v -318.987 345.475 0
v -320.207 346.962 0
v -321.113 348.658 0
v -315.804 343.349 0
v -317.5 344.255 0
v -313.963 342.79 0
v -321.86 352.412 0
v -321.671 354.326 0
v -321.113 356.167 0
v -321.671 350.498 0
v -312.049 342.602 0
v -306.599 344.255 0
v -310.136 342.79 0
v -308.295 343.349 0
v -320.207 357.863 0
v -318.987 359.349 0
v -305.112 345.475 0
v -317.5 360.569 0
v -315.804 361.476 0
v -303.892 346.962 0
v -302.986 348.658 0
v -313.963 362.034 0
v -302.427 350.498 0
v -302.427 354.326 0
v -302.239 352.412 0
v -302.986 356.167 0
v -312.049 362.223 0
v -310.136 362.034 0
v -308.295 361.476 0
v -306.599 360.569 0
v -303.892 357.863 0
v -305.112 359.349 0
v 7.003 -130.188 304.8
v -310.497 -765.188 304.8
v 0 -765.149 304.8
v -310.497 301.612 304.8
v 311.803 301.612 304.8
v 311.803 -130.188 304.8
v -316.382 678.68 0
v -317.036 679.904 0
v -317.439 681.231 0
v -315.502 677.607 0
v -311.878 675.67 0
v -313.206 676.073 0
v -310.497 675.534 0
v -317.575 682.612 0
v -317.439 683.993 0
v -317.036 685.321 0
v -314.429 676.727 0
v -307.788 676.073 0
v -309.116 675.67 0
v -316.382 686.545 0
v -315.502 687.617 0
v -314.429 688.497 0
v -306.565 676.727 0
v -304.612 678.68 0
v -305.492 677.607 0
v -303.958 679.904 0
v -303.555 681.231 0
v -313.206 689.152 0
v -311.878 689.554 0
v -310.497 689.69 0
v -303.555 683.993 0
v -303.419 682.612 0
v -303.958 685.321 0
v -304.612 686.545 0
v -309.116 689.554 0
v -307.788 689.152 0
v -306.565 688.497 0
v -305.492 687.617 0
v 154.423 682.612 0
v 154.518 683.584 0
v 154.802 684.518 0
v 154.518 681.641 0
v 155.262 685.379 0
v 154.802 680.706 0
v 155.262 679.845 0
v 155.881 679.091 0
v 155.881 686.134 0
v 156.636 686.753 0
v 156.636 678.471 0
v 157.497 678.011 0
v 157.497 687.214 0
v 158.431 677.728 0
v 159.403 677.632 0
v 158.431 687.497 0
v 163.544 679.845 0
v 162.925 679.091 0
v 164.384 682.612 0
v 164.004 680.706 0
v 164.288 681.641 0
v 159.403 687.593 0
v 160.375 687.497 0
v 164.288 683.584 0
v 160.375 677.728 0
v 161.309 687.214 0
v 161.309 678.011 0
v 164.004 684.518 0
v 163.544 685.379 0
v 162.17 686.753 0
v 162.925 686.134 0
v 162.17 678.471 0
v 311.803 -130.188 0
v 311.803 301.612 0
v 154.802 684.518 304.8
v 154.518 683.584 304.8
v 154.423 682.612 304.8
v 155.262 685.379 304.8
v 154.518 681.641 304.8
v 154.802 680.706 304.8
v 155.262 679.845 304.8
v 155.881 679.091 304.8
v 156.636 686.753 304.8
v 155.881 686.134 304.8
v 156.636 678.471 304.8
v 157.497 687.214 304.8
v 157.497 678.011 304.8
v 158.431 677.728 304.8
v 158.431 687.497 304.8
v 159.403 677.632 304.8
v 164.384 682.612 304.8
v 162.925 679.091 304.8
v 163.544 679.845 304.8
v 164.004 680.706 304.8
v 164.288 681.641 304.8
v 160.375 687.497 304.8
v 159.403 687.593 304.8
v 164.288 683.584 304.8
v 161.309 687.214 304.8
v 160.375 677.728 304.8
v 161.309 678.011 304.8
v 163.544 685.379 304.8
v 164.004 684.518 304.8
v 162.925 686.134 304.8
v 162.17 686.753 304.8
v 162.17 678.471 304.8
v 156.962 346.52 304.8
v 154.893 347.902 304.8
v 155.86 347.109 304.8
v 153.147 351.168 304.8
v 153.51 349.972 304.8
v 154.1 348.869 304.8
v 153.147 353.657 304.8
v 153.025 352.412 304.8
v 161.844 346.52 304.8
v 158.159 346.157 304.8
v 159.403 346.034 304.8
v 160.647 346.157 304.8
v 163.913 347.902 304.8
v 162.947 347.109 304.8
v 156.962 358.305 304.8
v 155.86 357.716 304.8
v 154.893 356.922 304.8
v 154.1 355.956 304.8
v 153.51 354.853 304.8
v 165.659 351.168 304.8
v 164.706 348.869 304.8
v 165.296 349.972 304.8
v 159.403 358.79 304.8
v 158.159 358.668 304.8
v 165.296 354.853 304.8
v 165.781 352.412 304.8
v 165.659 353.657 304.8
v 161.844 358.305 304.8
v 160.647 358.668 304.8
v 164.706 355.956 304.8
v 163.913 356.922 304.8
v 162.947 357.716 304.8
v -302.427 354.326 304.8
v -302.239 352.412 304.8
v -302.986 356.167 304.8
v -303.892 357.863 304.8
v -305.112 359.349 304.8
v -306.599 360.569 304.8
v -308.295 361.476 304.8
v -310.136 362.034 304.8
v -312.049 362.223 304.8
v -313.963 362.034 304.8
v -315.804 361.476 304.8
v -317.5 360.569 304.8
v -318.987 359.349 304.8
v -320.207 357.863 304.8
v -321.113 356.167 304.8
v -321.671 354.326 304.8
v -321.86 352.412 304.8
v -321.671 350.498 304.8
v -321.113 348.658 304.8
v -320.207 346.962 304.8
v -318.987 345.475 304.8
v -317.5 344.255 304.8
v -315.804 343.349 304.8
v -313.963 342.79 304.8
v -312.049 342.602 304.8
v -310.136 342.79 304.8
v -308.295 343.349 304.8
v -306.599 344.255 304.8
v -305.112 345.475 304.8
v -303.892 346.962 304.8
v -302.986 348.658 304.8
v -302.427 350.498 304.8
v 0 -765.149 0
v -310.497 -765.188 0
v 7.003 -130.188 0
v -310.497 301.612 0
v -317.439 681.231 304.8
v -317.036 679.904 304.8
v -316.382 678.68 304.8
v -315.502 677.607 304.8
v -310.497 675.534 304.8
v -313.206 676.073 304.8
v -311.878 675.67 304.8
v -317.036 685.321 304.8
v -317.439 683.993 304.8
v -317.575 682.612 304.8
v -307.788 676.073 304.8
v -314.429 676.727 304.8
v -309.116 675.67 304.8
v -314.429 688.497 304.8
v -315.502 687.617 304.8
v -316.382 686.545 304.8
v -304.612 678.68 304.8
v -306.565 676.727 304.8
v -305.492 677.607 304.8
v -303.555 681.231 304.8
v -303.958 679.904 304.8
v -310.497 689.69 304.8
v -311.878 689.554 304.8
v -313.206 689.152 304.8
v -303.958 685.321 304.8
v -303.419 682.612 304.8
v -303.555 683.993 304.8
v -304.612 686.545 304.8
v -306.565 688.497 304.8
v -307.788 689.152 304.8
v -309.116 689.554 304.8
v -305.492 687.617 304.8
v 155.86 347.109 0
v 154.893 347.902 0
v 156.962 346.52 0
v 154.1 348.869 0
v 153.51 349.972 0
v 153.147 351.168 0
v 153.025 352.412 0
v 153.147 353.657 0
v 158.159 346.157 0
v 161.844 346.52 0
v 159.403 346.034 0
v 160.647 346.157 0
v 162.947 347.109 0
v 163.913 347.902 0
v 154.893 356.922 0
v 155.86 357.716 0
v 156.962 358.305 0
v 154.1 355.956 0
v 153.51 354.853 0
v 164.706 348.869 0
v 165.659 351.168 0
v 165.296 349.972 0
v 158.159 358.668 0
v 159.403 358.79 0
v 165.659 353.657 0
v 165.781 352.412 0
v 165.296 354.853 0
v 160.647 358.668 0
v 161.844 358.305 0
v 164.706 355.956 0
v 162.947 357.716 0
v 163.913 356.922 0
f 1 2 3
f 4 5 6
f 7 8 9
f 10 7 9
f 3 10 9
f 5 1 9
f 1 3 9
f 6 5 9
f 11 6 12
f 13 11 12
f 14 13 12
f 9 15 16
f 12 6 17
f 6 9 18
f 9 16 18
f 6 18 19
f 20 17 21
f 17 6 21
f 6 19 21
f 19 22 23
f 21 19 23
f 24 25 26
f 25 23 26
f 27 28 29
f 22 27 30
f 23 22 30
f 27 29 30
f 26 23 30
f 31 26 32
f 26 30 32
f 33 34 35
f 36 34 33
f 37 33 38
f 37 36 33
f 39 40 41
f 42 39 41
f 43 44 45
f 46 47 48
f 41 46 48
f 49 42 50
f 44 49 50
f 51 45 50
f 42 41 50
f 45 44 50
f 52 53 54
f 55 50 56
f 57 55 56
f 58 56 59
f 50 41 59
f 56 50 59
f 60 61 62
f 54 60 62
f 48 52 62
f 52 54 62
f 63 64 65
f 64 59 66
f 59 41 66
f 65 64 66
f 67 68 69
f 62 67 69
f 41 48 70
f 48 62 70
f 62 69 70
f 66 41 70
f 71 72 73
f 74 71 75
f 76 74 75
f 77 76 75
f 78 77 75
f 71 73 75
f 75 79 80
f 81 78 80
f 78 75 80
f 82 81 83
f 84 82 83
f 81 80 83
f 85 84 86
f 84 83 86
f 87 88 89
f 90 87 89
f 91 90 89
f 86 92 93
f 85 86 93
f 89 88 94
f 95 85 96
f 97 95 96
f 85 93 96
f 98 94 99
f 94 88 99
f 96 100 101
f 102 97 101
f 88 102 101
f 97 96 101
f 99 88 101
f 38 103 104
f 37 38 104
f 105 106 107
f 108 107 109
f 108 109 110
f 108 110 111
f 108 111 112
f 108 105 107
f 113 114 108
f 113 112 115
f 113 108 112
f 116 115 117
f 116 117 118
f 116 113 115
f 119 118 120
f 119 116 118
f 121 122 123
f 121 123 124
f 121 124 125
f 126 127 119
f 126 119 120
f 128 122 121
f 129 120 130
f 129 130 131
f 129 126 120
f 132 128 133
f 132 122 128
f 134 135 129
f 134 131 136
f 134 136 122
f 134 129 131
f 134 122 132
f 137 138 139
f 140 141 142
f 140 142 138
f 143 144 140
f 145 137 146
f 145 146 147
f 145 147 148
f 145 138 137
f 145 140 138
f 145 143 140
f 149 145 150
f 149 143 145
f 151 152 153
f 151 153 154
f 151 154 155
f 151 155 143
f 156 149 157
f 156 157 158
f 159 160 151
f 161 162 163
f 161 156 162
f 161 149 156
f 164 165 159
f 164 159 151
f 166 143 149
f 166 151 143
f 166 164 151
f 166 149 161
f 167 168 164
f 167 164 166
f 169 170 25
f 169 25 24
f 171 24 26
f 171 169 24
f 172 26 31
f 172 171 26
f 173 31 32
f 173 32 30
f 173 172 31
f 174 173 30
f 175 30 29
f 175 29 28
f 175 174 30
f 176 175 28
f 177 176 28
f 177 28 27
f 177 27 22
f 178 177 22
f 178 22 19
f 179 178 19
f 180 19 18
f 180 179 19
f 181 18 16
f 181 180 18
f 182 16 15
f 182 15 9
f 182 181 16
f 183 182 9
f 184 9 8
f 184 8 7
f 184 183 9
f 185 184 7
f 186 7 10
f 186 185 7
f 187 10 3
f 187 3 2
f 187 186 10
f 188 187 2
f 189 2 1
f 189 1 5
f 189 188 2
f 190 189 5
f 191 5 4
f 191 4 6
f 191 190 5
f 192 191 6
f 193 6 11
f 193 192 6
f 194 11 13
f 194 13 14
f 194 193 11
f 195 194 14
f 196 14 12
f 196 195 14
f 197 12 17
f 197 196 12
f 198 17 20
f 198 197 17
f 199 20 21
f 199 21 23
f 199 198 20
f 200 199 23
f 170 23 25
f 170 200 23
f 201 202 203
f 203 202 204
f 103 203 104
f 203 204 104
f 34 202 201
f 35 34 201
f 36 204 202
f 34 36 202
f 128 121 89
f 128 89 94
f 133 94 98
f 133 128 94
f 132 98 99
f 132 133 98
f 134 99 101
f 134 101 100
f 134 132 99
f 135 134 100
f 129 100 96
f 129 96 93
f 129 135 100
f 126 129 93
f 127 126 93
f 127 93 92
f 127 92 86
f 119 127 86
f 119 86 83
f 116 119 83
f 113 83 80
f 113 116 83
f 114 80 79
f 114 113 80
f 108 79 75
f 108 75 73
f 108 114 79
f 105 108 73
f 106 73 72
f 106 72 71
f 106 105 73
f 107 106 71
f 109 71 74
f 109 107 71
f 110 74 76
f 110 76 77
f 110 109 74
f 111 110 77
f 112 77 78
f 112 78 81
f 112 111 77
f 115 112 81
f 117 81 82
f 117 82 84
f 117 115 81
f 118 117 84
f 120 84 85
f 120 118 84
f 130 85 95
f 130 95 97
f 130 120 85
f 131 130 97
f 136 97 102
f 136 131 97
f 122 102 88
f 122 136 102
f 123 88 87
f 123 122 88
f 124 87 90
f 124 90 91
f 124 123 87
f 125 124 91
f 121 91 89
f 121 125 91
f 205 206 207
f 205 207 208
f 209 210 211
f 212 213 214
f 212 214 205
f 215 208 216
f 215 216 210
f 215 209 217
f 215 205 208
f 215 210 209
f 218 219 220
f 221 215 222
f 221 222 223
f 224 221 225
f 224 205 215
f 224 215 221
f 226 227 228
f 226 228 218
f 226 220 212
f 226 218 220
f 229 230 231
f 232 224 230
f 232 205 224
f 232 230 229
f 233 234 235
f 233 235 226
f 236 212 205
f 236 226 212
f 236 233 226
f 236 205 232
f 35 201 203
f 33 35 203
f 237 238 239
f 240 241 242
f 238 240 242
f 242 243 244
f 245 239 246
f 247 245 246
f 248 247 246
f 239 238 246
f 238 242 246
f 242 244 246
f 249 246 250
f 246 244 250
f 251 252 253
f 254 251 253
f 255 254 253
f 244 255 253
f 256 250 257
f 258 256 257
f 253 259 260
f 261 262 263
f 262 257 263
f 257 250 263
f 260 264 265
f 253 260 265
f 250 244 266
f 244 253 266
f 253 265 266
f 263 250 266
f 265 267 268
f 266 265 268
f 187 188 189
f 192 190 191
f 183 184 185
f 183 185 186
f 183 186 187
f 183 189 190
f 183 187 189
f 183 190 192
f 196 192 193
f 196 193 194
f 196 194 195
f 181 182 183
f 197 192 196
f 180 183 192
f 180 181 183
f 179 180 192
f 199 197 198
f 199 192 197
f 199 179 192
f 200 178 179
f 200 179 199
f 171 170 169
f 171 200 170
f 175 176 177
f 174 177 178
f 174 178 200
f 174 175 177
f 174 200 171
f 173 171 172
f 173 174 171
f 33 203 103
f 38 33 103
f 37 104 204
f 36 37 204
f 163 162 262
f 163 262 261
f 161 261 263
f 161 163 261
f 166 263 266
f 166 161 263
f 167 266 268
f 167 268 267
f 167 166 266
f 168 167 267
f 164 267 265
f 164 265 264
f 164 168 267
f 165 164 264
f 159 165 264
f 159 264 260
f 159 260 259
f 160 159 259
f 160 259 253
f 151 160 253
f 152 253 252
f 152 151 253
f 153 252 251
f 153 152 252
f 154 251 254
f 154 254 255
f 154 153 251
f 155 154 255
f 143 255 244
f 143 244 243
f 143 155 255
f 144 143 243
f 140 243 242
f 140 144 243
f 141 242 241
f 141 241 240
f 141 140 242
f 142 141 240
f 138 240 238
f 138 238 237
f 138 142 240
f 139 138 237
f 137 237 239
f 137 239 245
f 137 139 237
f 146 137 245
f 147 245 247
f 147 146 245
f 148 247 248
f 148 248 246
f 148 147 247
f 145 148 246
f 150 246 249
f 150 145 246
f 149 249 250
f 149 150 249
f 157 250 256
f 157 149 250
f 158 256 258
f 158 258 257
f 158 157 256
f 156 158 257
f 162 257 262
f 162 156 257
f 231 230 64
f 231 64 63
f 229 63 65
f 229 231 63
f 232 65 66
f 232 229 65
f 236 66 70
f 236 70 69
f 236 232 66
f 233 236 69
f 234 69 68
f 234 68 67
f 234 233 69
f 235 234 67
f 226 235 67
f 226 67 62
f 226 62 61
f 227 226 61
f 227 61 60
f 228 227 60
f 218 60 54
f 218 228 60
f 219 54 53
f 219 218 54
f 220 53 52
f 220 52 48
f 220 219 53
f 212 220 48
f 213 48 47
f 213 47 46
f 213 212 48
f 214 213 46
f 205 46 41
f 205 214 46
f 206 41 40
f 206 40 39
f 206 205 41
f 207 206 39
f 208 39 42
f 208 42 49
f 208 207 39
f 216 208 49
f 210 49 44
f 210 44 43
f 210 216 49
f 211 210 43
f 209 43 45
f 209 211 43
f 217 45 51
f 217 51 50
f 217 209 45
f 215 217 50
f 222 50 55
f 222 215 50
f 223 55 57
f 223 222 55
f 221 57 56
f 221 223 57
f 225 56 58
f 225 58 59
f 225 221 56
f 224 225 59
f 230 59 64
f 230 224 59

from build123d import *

# Parameters (mm, degrees)
F1_DEPTH = 304.8
F2_R     = 9.810482
F2_R_2   = 6.378155
F2_R_3   = 4.98051
F2_R_4   = 7.078036
F3_DEPTH = 304.8


with BuildPart() as f1:
    # F0 (on Top) → F1 (new body)
    with BuildSketch(Plane.XY):
        Polygon((311.803085, 301.612325), (-310.496915, 301.612325), (-310.496915, -765.187675), (0, -765.149057), (7.003085, -130.187675), (311.803085, -130.187675), align=None)
    extrude(amount=F1_DEPTH)


with BuildPart() as f3:
    # F2 (on face) → F3 (new body)
    with BuildSketch(Plane.XY.offset(304.8)):
        with Locations((-312.049458, 352.412325)):
            Circle(F2_R)
        with Locations((159.403085, 352.412325)):
            Circle(F2_R_2)
        with Locations((159.403085, 682.612325)):
            Circle(F2_R_3)
        with Locations((-310.496915, 682.612325)):
            Circle(F2_R_4)
    extrude(amount=-F3_DEPTH)


solid = Compound([f1.part, f3.part])
